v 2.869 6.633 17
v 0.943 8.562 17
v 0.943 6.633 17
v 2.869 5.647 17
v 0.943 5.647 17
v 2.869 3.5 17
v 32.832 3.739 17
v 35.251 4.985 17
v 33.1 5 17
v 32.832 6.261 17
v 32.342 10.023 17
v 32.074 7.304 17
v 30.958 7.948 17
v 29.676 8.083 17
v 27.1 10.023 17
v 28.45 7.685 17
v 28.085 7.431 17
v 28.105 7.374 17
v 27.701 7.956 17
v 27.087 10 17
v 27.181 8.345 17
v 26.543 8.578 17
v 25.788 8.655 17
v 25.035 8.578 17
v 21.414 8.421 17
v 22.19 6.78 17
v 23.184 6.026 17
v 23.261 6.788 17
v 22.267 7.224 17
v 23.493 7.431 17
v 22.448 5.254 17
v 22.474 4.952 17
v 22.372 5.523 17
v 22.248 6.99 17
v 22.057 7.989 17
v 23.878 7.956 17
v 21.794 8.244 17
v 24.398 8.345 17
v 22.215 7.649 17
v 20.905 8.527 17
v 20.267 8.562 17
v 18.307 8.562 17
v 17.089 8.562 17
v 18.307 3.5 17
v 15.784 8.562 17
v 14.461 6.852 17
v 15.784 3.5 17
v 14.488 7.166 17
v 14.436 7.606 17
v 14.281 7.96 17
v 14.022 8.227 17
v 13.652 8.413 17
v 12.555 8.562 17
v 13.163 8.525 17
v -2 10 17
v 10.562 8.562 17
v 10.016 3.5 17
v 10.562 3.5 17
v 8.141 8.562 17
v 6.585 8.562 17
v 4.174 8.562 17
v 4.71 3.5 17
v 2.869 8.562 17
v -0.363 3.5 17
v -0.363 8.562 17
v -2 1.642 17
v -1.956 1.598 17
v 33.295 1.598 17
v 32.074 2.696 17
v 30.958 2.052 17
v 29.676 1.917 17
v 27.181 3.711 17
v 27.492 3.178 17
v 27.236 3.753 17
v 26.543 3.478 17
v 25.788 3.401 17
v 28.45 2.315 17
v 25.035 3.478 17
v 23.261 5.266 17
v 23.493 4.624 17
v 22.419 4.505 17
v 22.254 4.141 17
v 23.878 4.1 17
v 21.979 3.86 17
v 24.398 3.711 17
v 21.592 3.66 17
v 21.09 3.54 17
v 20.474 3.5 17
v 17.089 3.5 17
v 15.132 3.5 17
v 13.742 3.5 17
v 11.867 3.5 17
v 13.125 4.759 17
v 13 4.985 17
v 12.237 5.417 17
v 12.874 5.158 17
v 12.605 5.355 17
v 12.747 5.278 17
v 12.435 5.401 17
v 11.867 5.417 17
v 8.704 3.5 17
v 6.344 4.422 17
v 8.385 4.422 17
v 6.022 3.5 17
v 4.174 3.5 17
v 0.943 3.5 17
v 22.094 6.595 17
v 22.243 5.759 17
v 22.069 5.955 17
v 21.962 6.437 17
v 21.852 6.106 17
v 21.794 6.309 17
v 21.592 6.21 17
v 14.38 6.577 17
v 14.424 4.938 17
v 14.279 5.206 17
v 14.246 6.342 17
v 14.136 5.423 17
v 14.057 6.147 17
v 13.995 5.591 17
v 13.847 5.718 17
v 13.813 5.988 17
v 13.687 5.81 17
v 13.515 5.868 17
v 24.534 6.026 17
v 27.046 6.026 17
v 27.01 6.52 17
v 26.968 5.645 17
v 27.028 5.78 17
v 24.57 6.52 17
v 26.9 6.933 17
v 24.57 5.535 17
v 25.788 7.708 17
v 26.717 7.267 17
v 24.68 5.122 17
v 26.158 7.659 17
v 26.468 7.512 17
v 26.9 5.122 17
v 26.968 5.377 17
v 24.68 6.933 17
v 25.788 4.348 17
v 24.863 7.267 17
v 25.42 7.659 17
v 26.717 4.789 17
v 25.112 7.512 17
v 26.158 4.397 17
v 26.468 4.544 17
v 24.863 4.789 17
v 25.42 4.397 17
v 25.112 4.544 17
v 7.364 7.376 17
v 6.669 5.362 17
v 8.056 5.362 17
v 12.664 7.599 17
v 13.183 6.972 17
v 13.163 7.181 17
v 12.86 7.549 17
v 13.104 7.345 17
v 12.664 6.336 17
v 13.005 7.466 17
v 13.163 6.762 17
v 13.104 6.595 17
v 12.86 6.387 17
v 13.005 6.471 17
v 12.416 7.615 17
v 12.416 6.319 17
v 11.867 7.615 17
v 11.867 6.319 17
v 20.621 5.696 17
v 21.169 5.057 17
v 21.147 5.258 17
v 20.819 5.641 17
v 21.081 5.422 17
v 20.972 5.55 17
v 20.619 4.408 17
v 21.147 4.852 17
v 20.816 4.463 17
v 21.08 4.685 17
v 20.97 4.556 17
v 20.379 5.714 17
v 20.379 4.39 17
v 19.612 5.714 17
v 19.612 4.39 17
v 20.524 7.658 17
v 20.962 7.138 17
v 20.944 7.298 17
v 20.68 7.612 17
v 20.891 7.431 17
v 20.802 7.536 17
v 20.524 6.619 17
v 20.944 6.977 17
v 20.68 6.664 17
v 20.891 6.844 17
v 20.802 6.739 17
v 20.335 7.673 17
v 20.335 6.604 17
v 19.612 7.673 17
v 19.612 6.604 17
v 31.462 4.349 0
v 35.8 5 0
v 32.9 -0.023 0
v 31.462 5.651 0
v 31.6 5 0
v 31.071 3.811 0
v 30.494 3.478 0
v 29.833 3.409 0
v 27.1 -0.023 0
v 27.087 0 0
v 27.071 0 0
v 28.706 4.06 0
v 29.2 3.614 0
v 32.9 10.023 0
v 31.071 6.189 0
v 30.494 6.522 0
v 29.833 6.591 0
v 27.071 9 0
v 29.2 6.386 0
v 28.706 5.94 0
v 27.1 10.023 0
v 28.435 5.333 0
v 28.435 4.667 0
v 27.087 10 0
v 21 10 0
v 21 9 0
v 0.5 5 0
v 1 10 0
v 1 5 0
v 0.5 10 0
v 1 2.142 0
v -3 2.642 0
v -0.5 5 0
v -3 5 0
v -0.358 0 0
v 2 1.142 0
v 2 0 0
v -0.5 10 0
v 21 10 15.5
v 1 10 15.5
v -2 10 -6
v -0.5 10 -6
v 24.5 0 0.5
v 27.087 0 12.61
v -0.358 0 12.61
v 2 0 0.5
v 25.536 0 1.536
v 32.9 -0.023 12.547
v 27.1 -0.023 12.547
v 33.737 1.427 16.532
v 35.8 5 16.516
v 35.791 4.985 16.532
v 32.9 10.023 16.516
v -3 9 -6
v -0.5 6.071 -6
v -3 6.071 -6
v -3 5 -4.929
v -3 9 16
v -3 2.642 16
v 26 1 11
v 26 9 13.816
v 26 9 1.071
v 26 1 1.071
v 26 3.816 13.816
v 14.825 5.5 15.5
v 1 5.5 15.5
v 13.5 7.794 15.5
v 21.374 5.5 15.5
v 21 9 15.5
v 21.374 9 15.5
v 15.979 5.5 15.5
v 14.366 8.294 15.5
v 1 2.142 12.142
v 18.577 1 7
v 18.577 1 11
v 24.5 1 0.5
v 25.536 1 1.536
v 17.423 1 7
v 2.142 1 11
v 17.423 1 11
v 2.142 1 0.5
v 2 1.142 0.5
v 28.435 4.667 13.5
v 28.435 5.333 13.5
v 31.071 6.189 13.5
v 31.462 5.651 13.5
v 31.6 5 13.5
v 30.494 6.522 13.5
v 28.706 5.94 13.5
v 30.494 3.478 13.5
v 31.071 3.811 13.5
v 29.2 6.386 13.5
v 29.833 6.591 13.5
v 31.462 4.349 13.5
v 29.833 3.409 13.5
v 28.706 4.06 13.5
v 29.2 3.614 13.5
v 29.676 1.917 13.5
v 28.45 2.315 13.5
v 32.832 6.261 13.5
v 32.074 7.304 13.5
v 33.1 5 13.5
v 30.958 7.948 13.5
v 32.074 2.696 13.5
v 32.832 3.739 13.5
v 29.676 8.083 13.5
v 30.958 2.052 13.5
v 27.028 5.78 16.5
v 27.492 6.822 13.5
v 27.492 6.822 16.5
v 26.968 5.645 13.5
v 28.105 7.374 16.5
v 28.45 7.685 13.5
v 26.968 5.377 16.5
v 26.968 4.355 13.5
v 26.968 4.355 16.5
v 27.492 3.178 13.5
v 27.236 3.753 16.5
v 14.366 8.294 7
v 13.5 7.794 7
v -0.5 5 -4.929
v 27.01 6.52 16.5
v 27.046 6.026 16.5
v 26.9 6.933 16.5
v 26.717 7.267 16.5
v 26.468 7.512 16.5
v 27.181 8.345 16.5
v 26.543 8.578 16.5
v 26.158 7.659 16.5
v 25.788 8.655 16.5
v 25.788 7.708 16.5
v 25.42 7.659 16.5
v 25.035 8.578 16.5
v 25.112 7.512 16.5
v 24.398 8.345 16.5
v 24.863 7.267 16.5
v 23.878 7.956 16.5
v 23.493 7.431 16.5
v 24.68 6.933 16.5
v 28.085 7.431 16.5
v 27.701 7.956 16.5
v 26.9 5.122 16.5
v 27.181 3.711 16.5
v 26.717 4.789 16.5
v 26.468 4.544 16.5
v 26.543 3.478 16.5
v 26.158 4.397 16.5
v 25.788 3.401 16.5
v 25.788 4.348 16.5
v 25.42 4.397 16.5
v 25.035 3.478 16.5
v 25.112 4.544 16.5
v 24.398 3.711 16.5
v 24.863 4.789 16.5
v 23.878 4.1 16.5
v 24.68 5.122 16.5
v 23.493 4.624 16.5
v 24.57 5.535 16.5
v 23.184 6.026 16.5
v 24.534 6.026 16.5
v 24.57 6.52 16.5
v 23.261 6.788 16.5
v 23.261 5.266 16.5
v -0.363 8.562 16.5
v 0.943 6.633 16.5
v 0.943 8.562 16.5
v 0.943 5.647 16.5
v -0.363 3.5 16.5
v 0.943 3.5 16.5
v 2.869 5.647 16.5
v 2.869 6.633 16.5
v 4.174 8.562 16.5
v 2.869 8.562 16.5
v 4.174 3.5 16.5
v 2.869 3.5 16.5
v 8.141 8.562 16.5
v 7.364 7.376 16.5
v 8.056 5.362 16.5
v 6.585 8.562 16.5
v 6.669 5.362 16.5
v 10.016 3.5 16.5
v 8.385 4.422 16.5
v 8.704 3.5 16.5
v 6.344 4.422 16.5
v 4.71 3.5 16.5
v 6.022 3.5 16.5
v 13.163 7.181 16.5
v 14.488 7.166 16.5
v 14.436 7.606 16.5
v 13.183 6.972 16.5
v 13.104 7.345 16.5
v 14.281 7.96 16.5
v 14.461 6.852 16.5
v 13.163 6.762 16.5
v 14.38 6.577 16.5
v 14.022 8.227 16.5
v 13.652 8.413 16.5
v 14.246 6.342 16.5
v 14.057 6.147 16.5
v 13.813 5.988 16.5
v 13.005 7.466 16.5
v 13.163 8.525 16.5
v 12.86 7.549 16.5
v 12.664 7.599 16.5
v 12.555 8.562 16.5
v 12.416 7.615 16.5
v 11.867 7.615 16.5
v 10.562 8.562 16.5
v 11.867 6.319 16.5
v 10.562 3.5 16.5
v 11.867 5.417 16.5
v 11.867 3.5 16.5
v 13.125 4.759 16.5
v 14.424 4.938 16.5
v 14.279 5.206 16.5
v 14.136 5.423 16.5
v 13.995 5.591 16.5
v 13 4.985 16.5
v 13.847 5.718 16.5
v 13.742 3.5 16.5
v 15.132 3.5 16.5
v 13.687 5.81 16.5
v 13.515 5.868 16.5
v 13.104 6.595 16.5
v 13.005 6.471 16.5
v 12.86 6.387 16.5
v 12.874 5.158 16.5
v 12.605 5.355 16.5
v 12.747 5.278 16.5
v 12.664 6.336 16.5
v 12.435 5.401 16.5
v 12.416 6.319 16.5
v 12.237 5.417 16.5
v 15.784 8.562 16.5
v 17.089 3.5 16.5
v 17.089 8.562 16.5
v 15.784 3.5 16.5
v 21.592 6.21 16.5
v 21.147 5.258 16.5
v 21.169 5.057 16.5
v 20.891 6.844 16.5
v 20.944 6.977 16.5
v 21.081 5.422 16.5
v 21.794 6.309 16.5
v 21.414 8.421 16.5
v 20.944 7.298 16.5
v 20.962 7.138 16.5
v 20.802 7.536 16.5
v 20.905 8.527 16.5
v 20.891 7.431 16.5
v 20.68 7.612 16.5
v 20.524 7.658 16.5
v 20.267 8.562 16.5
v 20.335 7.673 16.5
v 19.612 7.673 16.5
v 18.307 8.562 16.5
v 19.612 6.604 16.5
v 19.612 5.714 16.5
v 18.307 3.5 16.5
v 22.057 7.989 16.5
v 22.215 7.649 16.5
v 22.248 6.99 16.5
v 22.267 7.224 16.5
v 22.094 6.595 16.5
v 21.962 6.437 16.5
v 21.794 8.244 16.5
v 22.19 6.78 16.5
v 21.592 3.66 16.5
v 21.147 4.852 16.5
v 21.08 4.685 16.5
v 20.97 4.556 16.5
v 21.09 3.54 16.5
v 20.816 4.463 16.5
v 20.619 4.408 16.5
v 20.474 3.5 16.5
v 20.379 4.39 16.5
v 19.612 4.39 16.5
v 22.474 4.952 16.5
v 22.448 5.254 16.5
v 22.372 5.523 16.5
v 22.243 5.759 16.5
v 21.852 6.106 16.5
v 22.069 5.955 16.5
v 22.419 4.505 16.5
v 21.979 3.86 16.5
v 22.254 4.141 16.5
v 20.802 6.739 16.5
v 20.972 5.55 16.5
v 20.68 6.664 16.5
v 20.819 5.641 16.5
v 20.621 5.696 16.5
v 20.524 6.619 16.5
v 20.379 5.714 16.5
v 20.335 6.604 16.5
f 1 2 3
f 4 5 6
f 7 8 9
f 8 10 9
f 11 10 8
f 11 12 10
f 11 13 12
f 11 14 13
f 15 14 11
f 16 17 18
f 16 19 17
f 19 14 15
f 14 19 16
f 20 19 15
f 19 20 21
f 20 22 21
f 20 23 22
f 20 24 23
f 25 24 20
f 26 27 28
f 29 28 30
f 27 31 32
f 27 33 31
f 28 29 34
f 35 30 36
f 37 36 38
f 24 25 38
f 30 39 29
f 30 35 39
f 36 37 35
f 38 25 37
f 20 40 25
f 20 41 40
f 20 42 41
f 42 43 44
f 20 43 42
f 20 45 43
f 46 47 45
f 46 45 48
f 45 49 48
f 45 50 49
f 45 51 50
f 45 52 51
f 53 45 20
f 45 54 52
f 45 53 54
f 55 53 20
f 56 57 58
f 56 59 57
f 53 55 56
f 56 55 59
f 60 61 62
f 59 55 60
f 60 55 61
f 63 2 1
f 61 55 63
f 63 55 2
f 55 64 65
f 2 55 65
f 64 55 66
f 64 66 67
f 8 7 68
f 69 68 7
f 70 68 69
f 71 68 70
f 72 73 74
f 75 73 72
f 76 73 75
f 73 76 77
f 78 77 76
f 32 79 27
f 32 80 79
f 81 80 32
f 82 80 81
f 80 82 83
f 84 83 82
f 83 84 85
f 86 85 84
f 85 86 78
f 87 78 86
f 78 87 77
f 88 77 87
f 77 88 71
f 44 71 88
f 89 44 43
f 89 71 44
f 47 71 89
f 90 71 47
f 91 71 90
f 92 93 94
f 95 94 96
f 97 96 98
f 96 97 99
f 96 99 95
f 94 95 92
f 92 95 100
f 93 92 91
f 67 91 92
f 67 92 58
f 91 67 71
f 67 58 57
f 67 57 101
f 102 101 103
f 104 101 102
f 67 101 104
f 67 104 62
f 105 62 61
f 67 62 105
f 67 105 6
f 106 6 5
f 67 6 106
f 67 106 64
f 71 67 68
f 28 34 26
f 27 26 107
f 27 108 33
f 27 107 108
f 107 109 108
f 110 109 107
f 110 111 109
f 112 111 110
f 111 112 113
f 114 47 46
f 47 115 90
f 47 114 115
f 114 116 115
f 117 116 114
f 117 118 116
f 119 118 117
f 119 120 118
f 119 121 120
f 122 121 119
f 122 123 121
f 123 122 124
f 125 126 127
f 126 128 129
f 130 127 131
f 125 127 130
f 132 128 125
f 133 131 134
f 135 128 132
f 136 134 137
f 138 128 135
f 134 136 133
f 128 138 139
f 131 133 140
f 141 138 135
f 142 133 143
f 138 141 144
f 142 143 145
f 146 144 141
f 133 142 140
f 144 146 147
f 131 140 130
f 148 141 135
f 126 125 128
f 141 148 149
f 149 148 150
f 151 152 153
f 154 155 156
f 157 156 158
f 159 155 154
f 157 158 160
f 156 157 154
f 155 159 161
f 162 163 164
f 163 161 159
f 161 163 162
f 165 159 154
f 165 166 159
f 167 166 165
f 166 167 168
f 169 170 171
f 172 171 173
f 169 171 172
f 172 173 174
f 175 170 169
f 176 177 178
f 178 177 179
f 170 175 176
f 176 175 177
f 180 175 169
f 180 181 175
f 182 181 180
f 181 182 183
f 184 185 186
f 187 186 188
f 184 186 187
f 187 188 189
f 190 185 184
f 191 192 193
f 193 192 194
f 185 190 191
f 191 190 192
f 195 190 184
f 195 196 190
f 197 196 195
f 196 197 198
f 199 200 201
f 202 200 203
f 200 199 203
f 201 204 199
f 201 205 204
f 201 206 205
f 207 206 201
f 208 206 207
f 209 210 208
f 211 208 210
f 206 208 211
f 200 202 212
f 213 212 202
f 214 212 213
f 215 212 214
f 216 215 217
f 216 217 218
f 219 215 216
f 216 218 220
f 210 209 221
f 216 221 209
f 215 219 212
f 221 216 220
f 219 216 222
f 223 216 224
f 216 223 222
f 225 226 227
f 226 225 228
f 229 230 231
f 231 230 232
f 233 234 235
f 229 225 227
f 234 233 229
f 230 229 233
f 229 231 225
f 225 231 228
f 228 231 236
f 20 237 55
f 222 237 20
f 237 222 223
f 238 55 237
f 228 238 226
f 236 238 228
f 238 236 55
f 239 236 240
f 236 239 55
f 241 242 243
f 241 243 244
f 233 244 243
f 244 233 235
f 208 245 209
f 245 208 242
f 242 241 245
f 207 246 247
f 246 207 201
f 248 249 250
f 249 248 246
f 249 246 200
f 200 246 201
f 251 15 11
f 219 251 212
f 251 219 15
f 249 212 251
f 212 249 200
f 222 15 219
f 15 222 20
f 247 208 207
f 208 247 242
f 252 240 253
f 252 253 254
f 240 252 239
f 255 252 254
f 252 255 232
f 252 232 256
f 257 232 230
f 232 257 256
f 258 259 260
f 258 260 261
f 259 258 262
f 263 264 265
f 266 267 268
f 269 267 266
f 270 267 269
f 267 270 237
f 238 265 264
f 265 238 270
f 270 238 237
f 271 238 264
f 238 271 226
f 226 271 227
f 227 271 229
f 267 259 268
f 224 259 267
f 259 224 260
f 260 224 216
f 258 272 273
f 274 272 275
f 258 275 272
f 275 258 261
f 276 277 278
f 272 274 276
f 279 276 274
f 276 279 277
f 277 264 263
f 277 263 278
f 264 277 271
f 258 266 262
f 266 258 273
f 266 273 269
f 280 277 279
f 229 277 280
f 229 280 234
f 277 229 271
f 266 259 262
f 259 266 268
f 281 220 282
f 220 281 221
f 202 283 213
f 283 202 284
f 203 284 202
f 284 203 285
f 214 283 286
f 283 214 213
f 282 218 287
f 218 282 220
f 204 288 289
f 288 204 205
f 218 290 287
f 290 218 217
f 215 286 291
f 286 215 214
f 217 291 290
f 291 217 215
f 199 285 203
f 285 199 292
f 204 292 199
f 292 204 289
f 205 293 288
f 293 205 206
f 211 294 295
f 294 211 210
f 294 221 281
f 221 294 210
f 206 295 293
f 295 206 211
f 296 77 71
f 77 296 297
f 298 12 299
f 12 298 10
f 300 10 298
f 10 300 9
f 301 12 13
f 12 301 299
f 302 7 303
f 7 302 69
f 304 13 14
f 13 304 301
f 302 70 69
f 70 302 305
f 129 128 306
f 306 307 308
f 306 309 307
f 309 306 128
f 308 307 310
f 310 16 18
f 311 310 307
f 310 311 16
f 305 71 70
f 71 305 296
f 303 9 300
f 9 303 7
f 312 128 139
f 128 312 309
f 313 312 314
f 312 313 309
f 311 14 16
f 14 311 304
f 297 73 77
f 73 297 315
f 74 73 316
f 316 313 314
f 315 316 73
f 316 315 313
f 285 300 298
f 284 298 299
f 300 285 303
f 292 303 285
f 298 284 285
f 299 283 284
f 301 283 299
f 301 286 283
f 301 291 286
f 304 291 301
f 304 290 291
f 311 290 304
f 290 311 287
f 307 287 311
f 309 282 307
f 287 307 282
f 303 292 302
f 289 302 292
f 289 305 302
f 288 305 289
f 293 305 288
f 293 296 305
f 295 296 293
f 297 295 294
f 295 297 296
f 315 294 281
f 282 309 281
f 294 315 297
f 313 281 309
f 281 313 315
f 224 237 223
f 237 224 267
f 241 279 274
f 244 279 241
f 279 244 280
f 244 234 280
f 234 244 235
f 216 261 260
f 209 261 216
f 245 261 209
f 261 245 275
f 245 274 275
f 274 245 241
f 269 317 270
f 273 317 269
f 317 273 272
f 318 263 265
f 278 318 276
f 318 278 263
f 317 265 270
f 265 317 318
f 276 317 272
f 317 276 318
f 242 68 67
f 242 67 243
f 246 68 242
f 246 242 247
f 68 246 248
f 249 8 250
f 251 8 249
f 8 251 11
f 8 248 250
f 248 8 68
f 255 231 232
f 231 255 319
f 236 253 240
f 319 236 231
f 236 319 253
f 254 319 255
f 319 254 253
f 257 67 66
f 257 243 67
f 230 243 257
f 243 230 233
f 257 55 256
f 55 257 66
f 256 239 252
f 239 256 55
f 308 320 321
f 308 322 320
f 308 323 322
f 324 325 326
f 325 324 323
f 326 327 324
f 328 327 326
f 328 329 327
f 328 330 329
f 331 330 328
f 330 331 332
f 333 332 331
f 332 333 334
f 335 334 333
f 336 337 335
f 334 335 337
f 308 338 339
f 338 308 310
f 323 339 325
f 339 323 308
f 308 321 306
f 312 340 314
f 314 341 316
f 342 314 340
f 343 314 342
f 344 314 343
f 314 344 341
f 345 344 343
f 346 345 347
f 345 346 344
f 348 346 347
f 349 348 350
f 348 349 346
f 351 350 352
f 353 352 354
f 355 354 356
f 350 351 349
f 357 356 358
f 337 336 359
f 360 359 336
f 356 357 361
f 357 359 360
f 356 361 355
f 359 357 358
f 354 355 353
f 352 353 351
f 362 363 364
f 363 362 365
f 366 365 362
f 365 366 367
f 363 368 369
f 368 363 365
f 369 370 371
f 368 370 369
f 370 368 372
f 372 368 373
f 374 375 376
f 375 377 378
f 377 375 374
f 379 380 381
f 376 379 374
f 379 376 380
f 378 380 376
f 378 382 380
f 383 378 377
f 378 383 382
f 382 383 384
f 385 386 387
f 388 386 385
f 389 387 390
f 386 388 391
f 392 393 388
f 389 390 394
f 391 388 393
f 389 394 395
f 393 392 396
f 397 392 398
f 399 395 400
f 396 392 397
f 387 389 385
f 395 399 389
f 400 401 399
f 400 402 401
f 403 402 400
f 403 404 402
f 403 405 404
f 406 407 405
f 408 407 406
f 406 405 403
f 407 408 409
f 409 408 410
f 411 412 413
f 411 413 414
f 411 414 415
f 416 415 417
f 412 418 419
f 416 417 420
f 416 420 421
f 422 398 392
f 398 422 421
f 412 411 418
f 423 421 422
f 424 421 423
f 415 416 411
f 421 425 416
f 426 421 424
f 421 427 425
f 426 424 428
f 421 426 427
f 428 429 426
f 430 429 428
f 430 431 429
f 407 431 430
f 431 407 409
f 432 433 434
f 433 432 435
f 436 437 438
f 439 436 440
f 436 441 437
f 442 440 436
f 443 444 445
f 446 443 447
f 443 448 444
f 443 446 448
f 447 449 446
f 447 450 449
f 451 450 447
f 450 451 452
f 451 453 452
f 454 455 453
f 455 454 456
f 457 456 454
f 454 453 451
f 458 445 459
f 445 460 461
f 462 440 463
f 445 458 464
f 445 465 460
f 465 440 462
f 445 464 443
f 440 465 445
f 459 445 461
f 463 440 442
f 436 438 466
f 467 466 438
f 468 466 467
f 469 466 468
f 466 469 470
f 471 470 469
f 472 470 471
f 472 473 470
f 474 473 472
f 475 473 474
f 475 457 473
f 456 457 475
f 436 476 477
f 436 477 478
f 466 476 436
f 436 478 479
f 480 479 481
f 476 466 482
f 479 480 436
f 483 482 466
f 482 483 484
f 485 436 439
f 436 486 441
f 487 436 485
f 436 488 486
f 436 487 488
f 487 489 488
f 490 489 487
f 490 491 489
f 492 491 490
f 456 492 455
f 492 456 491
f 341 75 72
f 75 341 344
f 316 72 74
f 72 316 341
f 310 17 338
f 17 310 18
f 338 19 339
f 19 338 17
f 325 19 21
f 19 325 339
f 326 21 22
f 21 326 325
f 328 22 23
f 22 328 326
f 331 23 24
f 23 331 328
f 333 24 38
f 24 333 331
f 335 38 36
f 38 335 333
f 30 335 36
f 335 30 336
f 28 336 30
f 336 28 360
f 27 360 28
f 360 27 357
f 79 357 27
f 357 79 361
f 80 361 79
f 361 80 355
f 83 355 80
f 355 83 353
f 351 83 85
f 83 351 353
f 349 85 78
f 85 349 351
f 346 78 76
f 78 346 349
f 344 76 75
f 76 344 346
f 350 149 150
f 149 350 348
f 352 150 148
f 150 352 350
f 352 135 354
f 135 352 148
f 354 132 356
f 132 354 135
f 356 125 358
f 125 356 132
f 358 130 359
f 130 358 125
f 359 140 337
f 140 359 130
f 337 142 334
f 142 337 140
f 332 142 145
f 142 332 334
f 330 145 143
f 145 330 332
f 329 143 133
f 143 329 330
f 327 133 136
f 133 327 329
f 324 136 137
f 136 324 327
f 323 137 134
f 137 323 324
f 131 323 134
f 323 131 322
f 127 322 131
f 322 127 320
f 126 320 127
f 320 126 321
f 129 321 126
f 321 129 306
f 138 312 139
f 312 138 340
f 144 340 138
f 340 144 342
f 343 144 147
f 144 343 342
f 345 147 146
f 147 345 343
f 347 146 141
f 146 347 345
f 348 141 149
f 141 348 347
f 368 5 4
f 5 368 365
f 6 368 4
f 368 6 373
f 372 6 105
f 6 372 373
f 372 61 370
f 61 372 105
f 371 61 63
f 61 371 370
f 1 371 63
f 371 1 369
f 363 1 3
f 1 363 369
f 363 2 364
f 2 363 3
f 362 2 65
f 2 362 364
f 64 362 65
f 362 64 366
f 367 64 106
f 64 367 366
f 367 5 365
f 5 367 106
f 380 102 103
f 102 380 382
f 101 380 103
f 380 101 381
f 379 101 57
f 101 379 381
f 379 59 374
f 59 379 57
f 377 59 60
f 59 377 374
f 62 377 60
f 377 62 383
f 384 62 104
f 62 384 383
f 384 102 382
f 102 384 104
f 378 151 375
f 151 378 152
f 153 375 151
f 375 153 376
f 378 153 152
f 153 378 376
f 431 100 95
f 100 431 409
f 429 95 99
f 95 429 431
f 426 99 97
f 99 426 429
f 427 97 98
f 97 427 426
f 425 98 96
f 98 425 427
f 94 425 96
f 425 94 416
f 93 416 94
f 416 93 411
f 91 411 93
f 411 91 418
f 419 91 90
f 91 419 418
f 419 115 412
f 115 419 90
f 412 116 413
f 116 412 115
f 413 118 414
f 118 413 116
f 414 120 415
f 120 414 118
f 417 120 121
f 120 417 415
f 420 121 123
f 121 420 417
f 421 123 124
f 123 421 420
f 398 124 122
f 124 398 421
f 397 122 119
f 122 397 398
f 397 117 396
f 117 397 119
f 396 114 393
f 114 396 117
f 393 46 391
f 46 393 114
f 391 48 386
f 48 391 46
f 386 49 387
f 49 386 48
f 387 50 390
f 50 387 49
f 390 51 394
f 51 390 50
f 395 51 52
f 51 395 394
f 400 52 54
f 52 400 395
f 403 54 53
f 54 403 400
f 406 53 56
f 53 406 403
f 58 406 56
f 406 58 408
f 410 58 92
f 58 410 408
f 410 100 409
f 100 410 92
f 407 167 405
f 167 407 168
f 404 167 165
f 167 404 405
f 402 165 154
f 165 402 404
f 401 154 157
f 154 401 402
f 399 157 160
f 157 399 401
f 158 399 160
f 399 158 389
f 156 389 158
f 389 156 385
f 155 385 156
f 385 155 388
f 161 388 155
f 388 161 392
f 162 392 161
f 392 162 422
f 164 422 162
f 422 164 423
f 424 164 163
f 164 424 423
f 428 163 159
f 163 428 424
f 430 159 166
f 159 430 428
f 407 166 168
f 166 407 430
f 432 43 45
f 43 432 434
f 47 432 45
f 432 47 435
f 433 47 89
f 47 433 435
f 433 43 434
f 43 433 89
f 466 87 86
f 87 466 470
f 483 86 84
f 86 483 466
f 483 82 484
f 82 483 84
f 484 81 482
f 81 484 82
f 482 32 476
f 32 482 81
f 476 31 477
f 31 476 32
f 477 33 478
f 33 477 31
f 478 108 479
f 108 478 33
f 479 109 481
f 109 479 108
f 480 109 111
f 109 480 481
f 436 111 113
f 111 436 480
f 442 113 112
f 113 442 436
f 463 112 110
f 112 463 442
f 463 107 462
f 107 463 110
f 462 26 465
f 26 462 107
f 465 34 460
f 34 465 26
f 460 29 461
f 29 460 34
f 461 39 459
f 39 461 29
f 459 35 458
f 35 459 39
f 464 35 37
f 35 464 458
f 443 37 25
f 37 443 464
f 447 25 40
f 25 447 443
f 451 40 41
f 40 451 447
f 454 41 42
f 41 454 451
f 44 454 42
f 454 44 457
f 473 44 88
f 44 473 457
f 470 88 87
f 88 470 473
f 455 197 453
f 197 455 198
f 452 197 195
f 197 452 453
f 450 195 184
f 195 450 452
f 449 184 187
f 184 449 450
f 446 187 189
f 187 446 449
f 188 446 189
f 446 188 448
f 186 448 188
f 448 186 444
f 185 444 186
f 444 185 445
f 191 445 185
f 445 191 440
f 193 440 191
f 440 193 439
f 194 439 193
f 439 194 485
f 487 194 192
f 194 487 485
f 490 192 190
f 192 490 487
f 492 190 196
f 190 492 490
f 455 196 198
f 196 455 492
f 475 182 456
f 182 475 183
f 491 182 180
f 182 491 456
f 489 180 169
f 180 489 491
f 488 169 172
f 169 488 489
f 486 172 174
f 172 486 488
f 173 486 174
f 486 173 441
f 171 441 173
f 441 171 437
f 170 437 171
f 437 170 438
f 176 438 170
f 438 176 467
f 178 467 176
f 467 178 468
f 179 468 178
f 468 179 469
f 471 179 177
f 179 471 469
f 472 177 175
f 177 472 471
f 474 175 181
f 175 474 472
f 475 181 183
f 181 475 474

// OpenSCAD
module fan_nozzle(){
    
difference(){    
union(){
cube([32,10,17]); // Main cube
translate([30,5,0])cylinder(r=5.8,h = 17, $fn=6);    
translate([-3,0,-6]) cube([3,10,23]);
//#translate([-2,5,0])cylinder(r=5.8,h = 17, $fn=6);        
}
// Mounting screw
translate([30,5,-10])cylinder(r=3.2/2,h = 24.5-0.2, $fn=15); // Screw cut
translate([30,5,17-3.5])cylinder(r=3.1,h = 20, $fn=15); // head cut

//#translate([-2,5,-10])cylinder(r=3.2/2,h = 24.5-0.2, $fn=15); // Screw cut
//#translate([-2,5,17-3.5])cylinder(r=3.1,h = 20, $fn=15); // head cut

// Fan entry hole
translate([1,10-1.5,-1])cube([20,3,16.5]);
translate([1,10-1.5,-1-5])cube([18,3,16.5]);
    
// Airway cutout
difference(){    
translate([1,1,-1])cube([25,8,16.5]);    
translate([0,0,10])rotate([45,0,0])cube([30,8,16.5]);    
translate([-1,-10,-1])rotate([0,0,45])cube([10,8,30]); 
translate([20,0,16])rotate([0,20,0])cube([10,20,10]);    
}
translate([2,-1,-4.5])cube([24,3,5]);
//#translate([-2,-1,-2])rotate([0,45,0])cube([5,10,5]);
translate([22,-1,-2])rotate([0,45,0])cube([5,10,5]);
    
}

// Air director
translate([18,0,7])rotate([0,0,30])cube([1,9,10]);


}

module fancy_corners(){
    
    translate([-10,-10.5,13])rotate([-20,0,0])cube([50,10,15]);
    translate([-16,-10.5,17.5])rotate([0,45,0])cube([10,30,15]);
    
    translate([46.5,-10.5,15])rotate([0,-45,30])cube([10,30,15]);
    translate([28.62,-10.5,15])rotate([0,-45,-30])cube([10,30,15]);

    translate([-5,-1,-7])rotate([0,0,0]) cube([10,6,7]);
    translate([-0.5,-1,-7])rotate([0,0,0]) cube([1,15,7]);
    translate([-5,4,-11])rotate([45,0,0]) cube([10,5,5]);

    //left cut
    translate([-6.5,-8,-5])rotate([0,0,45])cube([10,10,45]);
    translate([-7,-5,12])rotate([0,-45,0])cube([10,30,15]);
    
    translate([-7,5,-10])rotate([0,0,45])cube([10,10,35]);
    
    }

module fan_n(){
difference(){
fan_nozzle();
fancy_corners();    
translate([-1,3.5,16.5])linear_extrude(height = 0.6) {text("HARIBO", size = 5, font = "Helvetica Neue:style=Bold");}
}
}
fan_n();
